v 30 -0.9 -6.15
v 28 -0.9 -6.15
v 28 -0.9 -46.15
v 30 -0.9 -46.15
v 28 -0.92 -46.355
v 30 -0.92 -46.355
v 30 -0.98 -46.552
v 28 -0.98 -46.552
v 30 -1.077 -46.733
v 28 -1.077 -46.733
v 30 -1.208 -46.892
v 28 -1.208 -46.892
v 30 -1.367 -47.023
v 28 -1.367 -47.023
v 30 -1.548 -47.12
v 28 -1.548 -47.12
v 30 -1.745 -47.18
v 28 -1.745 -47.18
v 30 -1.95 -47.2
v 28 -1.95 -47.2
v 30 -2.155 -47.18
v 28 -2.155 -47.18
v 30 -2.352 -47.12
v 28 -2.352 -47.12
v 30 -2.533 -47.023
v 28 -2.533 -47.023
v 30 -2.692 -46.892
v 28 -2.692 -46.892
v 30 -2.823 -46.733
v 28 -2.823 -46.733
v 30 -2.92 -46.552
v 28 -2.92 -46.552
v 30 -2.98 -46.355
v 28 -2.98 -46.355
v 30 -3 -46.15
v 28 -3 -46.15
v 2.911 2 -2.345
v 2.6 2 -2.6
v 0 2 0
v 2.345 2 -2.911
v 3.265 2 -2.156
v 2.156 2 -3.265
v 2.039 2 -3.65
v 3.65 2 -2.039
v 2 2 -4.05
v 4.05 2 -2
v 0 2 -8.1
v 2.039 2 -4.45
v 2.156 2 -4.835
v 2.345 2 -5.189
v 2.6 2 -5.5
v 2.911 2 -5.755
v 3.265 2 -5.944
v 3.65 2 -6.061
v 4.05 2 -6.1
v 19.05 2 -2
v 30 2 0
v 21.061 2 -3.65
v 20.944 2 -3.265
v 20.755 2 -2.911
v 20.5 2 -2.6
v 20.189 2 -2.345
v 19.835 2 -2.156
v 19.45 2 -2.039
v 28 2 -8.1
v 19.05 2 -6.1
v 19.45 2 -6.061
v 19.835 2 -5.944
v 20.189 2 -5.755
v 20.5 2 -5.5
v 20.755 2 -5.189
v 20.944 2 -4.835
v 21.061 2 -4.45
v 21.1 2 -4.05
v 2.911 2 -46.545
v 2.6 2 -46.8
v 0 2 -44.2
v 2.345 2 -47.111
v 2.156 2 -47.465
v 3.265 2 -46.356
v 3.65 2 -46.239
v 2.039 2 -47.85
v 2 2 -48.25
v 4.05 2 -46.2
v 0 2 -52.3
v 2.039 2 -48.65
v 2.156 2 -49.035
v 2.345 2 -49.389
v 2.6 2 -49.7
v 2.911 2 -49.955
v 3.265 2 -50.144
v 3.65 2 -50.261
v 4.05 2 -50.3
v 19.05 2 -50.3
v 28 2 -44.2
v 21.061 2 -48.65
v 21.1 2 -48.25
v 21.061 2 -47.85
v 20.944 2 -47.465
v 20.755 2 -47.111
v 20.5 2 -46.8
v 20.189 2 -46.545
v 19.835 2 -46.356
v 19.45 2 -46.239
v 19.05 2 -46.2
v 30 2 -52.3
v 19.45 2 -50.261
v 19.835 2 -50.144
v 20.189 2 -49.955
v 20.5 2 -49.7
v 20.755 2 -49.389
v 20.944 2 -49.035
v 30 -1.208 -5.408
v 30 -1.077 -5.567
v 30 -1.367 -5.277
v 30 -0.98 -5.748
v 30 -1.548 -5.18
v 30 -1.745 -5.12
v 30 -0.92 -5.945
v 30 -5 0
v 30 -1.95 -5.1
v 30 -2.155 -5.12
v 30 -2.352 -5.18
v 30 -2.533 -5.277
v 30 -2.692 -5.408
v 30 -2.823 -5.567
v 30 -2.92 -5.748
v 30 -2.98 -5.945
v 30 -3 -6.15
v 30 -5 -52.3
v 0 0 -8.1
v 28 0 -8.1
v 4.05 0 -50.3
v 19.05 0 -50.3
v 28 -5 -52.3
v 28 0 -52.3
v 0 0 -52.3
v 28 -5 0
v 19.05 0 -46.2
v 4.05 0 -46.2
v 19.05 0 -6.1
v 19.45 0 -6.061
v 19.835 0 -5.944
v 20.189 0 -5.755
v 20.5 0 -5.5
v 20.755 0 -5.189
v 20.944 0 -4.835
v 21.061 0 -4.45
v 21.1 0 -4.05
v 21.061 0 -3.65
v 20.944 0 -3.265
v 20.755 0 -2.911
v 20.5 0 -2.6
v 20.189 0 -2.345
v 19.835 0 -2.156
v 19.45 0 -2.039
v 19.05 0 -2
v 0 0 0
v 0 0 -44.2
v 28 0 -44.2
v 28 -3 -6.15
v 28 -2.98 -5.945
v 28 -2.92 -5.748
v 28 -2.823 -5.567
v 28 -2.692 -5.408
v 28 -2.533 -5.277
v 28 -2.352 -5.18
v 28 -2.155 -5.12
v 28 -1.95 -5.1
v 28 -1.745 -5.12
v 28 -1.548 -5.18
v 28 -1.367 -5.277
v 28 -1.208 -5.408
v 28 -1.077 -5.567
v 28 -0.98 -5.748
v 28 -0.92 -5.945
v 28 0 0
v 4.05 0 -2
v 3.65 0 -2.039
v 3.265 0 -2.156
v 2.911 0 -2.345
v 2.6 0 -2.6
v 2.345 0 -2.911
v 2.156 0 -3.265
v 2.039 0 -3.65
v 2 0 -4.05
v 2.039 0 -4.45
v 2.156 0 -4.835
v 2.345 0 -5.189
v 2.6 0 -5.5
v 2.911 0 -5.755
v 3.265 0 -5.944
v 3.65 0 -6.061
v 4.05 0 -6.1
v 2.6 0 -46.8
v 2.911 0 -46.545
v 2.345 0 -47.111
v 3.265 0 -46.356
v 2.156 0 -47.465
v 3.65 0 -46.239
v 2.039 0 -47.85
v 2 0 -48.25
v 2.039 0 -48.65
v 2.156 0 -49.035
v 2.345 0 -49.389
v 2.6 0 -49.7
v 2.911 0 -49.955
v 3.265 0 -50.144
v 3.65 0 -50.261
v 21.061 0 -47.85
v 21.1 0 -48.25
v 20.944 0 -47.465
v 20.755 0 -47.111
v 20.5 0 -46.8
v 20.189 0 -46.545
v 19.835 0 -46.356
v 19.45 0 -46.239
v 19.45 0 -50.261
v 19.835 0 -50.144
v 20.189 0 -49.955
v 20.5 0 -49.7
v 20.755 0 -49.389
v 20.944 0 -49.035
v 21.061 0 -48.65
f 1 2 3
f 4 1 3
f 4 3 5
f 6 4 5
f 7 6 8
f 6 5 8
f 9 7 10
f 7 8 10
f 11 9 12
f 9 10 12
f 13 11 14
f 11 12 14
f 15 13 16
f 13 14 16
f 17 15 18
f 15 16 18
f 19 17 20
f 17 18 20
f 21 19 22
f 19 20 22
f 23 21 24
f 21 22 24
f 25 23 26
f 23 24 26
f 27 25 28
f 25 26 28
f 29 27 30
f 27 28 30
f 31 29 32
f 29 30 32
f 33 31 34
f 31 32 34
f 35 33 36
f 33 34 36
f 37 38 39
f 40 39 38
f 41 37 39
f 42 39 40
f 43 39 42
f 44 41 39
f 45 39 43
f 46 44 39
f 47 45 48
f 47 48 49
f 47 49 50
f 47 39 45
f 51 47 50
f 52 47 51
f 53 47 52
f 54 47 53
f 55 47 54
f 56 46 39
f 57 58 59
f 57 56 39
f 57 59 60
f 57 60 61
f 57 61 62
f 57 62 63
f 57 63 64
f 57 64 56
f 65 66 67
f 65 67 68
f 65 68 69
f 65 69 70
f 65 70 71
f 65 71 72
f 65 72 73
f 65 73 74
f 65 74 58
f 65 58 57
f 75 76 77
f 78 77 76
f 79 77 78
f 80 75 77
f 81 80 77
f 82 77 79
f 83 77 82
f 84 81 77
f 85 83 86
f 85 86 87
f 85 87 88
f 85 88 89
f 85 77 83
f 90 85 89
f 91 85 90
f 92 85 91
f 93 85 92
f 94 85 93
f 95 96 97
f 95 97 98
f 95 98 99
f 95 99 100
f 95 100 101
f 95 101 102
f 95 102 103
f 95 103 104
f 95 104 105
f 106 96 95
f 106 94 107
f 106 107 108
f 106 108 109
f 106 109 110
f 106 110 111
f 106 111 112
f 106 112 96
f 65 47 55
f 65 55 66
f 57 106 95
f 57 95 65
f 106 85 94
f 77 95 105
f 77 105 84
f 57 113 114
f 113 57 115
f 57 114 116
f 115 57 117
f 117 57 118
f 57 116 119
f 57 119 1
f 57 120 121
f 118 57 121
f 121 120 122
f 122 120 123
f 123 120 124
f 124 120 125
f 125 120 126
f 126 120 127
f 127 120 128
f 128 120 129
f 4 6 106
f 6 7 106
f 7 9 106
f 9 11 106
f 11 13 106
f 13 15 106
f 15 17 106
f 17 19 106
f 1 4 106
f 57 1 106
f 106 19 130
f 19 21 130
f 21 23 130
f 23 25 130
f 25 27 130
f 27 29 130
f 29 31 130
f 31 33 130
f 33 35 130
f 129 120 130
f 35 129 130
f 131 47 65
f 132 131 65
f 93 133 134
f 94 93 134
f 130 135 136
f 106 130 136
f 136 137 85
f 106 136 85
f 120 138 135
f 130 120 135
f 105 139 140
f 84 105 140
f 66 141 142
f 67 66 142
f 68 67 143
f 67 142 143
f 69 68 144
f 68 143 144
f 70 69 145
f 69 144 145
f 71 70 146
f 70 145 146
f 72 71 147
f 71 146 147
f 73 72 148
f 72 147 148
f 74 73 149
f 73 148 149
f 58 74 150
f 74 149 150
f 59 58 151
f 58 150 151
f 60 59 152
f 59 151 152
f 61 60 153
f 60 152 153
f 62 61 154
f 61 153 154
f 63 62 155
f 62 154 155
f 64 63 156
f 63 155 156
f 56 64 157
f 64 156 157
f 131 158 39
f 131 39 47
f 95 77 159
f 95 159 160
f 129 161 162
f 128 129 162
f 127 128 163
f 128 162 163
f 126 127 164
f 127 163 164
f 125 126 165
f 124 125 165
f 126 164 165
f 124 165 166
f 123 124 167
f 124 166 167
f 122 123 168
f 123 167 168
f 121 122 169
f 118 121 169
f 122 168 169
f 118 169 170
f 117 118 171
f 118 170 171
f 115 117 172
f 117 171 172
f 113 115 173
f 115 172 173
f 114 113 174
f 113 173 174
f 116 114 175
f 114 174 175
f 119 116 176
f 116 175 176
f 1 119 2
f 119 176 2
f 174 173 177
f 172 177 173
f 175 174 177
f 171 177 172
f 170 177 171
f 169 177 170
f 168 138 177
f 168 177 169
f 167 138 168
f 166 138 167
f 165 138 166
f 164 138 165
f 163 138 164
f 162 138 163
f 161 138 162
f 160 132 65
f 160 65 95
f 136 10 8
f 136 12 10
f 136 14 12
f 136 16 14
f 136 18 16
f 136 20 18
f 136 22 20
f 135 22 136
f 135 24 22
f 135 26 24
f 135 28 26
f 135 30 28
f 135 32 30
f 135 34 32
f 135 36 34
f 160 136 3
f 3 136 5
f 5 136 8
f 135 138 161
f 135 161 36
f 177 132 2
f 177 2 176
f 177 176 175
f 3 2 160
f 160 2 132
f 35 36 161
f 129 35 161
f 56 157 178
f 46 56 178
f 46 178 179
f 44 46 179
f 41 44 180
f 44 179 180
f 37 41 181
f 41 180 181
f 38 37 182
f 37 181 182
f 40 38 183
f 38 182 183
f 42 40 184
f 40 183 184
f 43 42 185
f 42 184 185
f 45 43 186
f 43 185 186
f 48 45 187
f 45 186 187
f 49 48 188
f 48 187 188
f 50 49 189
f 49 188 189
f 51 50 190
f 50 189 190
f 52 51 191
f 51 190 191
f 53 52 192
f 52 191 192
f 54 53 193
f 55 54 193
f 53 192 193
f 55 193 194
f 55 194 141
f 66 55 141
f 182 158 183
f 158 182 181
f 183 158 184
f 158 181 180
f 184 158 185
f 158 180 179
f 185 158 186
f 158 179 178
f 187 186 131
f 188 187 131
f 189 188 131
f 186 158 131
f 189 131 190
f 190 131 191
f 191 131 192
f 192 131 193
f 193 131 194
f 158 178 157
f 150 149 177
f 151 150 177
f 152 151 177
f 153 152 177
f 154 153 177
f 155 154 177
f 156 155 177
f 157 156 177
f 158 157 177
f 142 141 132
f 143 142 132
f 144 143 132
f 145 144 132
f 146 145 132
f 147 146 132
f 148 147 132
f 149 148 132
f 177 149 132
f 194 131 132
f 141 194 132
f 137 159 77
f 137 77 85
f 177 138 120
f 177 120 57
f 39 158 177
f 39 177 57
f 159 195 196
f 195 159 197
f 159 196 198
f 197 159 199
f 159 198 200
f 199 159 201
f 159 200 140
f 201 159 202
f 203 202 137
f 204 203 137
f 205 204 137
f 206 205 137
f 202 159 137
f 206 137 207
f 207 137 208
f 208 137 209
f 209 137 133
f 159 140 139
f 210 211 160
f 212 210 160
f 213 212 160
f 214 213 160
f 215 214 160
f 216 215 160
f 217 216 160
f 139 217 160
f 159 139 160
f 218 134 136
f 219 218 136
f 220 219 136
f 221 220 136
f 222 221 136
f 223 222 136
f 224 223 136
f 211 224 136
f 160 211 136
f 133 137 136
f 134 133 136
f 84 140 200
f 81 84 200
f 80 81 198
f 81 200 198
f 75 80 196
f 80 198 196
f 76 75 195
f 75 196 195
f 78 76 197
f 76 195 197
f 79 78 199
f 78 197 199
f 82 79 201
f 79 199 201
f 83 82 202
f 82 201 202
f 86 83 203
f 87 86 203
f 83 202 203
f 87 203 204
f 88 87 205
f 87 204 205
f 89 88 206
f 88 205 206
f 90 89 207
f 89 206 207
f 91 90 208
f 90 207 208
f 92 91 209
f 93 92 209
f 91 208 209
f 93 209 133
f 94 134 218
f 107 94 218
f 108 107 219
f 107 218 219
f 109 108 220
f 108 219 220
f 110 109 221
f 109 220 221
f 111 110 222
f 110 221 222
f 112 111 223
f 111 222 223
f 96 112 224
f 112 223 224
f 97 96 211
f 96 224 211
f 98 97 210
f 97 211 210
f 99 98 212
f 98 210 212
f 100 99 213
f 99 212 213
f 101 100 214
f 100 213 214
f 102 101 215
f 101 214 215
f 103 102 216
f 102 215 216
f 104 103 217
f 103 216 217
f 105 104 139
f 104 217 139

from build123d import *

# Parameters (mm, degrees)
SKETCH1_W           = 28
SKETCH1_H           = 26.15
BOSS_EXTRUDE1_DEPTH = 2
SKETCH12_W          = 52.3
SKETCH12_H          = 7
BOSS_EXTRUDE2_DEPTH = 2
SKETCH13_W          = 30
SKETCH13_H          = 36.1
CUT_EXTRUDE3_DEPTH  = 2
SKETCH15_W          = 2
SKETCH15_H          = 36.1
BOSS_EXTRUDE3_DEPTH = 2


with BuildPart() as part:
    # Sketch1 → Boss-Extrude1 (new body)
    # profile 1 of 2: a face of its own
    with BuildSketch(Plane(origin=(0, 0, 0), x_dir=(1, 0, 0), z_dir=(0, 1, 0))):
        with Locations((14, 39.225)):
            Rectangle(SKETCH1_W, SKETCH1_H)
        with BuildLine():
            Line((19.05, 46.2), (4.05, 46.2))
            ThreePointArc((4.05, 46.2), (2, 48.25), (4.05, 50.3))
            Line((4.05, 50.3), (19.05, 50.3))
            ThreePointArc((19.05, 50.3), (21.1, 48.25), (19.05, 46.2))
        make_face(mode=Mode.SUBTRACT)
    # profile 2 of 2: a face of its own
    with BuildSketch(Plane(origin=(0, 0, 0), x_dir=(1, 0, 0), z_dir=(0, 1, 0))):
        with Locations((14, 13.075)):
            Rectangle(SKETCH1_W, SKETCH1_H)
        with BuildLine():
            ThreePointArc((4.05, 2), (2, 4.05), (4.05, 6.1))
            Line((4.05, 6.1), (19.05, 6.1))
            ThreePointArc((19.05, 6.1), (21.1, 4.05), (19.05, 2))
            Line((19.05, 2), (4.05, 2))
        make_face(mode=Mode.SUBTRACT)
    extrude(amount=BOSS_EXTRUDE1_DEPTH)

    # Sketch12 → Boss-Extrude2 (add)
    with BuildSketch(Plane(origin=(28, 0, 0), x_dir=(0, 0, -1), z_dir=(1, 0, 0))):
        with Locations((26.15, -1.5)):
            Rectangle(SKETCH12_W, SKETCH12_H)
        with BuildLine():
            Line((6.15, -0.9), (46.15, -0.9))
            ThreePointArc((46.15, -0.9), (47.2, -1.95), (46.15, -3))
            Line((46.15, -3), (6.15, -3))
            ThreePointArc((6.15, -3), (5.1, -1.95), (6.15, -0.9))
        make_face(mode=Mode.SUBTRACT)
    extrude(amount=BOSS_EXTRUDE2_DEPTH)

    # Sketch13 → Cut-Extrude3 (cut)
    with BuildSketch(Plane(origin=(0, 2, 0), x_dir=(1, 0, 0), z_dir=(0, 1, 0))):
        with Locations((15, 26.15)):
            Rectangle(SKETCH13_W, SKETCH13_H)
    extrude(amount=-CUT_EXTRUDE3_DEPTH, mode=Mode.SUBTRACT)

    # Sketch15 → Boss-Extrude3 (add)
    with BuildSketch(Plane(origin=(0, 0, 0), x_dir=(1, 0, 0), z_dir=(0, 1, 0))):
        with Locations((29, 26.15)):
            Rectangle(SKETCH15_W, SKETCH15_H)
    extrude(amount=BOSS_EXTRUDE3_DEPTH)


solid = part.part
